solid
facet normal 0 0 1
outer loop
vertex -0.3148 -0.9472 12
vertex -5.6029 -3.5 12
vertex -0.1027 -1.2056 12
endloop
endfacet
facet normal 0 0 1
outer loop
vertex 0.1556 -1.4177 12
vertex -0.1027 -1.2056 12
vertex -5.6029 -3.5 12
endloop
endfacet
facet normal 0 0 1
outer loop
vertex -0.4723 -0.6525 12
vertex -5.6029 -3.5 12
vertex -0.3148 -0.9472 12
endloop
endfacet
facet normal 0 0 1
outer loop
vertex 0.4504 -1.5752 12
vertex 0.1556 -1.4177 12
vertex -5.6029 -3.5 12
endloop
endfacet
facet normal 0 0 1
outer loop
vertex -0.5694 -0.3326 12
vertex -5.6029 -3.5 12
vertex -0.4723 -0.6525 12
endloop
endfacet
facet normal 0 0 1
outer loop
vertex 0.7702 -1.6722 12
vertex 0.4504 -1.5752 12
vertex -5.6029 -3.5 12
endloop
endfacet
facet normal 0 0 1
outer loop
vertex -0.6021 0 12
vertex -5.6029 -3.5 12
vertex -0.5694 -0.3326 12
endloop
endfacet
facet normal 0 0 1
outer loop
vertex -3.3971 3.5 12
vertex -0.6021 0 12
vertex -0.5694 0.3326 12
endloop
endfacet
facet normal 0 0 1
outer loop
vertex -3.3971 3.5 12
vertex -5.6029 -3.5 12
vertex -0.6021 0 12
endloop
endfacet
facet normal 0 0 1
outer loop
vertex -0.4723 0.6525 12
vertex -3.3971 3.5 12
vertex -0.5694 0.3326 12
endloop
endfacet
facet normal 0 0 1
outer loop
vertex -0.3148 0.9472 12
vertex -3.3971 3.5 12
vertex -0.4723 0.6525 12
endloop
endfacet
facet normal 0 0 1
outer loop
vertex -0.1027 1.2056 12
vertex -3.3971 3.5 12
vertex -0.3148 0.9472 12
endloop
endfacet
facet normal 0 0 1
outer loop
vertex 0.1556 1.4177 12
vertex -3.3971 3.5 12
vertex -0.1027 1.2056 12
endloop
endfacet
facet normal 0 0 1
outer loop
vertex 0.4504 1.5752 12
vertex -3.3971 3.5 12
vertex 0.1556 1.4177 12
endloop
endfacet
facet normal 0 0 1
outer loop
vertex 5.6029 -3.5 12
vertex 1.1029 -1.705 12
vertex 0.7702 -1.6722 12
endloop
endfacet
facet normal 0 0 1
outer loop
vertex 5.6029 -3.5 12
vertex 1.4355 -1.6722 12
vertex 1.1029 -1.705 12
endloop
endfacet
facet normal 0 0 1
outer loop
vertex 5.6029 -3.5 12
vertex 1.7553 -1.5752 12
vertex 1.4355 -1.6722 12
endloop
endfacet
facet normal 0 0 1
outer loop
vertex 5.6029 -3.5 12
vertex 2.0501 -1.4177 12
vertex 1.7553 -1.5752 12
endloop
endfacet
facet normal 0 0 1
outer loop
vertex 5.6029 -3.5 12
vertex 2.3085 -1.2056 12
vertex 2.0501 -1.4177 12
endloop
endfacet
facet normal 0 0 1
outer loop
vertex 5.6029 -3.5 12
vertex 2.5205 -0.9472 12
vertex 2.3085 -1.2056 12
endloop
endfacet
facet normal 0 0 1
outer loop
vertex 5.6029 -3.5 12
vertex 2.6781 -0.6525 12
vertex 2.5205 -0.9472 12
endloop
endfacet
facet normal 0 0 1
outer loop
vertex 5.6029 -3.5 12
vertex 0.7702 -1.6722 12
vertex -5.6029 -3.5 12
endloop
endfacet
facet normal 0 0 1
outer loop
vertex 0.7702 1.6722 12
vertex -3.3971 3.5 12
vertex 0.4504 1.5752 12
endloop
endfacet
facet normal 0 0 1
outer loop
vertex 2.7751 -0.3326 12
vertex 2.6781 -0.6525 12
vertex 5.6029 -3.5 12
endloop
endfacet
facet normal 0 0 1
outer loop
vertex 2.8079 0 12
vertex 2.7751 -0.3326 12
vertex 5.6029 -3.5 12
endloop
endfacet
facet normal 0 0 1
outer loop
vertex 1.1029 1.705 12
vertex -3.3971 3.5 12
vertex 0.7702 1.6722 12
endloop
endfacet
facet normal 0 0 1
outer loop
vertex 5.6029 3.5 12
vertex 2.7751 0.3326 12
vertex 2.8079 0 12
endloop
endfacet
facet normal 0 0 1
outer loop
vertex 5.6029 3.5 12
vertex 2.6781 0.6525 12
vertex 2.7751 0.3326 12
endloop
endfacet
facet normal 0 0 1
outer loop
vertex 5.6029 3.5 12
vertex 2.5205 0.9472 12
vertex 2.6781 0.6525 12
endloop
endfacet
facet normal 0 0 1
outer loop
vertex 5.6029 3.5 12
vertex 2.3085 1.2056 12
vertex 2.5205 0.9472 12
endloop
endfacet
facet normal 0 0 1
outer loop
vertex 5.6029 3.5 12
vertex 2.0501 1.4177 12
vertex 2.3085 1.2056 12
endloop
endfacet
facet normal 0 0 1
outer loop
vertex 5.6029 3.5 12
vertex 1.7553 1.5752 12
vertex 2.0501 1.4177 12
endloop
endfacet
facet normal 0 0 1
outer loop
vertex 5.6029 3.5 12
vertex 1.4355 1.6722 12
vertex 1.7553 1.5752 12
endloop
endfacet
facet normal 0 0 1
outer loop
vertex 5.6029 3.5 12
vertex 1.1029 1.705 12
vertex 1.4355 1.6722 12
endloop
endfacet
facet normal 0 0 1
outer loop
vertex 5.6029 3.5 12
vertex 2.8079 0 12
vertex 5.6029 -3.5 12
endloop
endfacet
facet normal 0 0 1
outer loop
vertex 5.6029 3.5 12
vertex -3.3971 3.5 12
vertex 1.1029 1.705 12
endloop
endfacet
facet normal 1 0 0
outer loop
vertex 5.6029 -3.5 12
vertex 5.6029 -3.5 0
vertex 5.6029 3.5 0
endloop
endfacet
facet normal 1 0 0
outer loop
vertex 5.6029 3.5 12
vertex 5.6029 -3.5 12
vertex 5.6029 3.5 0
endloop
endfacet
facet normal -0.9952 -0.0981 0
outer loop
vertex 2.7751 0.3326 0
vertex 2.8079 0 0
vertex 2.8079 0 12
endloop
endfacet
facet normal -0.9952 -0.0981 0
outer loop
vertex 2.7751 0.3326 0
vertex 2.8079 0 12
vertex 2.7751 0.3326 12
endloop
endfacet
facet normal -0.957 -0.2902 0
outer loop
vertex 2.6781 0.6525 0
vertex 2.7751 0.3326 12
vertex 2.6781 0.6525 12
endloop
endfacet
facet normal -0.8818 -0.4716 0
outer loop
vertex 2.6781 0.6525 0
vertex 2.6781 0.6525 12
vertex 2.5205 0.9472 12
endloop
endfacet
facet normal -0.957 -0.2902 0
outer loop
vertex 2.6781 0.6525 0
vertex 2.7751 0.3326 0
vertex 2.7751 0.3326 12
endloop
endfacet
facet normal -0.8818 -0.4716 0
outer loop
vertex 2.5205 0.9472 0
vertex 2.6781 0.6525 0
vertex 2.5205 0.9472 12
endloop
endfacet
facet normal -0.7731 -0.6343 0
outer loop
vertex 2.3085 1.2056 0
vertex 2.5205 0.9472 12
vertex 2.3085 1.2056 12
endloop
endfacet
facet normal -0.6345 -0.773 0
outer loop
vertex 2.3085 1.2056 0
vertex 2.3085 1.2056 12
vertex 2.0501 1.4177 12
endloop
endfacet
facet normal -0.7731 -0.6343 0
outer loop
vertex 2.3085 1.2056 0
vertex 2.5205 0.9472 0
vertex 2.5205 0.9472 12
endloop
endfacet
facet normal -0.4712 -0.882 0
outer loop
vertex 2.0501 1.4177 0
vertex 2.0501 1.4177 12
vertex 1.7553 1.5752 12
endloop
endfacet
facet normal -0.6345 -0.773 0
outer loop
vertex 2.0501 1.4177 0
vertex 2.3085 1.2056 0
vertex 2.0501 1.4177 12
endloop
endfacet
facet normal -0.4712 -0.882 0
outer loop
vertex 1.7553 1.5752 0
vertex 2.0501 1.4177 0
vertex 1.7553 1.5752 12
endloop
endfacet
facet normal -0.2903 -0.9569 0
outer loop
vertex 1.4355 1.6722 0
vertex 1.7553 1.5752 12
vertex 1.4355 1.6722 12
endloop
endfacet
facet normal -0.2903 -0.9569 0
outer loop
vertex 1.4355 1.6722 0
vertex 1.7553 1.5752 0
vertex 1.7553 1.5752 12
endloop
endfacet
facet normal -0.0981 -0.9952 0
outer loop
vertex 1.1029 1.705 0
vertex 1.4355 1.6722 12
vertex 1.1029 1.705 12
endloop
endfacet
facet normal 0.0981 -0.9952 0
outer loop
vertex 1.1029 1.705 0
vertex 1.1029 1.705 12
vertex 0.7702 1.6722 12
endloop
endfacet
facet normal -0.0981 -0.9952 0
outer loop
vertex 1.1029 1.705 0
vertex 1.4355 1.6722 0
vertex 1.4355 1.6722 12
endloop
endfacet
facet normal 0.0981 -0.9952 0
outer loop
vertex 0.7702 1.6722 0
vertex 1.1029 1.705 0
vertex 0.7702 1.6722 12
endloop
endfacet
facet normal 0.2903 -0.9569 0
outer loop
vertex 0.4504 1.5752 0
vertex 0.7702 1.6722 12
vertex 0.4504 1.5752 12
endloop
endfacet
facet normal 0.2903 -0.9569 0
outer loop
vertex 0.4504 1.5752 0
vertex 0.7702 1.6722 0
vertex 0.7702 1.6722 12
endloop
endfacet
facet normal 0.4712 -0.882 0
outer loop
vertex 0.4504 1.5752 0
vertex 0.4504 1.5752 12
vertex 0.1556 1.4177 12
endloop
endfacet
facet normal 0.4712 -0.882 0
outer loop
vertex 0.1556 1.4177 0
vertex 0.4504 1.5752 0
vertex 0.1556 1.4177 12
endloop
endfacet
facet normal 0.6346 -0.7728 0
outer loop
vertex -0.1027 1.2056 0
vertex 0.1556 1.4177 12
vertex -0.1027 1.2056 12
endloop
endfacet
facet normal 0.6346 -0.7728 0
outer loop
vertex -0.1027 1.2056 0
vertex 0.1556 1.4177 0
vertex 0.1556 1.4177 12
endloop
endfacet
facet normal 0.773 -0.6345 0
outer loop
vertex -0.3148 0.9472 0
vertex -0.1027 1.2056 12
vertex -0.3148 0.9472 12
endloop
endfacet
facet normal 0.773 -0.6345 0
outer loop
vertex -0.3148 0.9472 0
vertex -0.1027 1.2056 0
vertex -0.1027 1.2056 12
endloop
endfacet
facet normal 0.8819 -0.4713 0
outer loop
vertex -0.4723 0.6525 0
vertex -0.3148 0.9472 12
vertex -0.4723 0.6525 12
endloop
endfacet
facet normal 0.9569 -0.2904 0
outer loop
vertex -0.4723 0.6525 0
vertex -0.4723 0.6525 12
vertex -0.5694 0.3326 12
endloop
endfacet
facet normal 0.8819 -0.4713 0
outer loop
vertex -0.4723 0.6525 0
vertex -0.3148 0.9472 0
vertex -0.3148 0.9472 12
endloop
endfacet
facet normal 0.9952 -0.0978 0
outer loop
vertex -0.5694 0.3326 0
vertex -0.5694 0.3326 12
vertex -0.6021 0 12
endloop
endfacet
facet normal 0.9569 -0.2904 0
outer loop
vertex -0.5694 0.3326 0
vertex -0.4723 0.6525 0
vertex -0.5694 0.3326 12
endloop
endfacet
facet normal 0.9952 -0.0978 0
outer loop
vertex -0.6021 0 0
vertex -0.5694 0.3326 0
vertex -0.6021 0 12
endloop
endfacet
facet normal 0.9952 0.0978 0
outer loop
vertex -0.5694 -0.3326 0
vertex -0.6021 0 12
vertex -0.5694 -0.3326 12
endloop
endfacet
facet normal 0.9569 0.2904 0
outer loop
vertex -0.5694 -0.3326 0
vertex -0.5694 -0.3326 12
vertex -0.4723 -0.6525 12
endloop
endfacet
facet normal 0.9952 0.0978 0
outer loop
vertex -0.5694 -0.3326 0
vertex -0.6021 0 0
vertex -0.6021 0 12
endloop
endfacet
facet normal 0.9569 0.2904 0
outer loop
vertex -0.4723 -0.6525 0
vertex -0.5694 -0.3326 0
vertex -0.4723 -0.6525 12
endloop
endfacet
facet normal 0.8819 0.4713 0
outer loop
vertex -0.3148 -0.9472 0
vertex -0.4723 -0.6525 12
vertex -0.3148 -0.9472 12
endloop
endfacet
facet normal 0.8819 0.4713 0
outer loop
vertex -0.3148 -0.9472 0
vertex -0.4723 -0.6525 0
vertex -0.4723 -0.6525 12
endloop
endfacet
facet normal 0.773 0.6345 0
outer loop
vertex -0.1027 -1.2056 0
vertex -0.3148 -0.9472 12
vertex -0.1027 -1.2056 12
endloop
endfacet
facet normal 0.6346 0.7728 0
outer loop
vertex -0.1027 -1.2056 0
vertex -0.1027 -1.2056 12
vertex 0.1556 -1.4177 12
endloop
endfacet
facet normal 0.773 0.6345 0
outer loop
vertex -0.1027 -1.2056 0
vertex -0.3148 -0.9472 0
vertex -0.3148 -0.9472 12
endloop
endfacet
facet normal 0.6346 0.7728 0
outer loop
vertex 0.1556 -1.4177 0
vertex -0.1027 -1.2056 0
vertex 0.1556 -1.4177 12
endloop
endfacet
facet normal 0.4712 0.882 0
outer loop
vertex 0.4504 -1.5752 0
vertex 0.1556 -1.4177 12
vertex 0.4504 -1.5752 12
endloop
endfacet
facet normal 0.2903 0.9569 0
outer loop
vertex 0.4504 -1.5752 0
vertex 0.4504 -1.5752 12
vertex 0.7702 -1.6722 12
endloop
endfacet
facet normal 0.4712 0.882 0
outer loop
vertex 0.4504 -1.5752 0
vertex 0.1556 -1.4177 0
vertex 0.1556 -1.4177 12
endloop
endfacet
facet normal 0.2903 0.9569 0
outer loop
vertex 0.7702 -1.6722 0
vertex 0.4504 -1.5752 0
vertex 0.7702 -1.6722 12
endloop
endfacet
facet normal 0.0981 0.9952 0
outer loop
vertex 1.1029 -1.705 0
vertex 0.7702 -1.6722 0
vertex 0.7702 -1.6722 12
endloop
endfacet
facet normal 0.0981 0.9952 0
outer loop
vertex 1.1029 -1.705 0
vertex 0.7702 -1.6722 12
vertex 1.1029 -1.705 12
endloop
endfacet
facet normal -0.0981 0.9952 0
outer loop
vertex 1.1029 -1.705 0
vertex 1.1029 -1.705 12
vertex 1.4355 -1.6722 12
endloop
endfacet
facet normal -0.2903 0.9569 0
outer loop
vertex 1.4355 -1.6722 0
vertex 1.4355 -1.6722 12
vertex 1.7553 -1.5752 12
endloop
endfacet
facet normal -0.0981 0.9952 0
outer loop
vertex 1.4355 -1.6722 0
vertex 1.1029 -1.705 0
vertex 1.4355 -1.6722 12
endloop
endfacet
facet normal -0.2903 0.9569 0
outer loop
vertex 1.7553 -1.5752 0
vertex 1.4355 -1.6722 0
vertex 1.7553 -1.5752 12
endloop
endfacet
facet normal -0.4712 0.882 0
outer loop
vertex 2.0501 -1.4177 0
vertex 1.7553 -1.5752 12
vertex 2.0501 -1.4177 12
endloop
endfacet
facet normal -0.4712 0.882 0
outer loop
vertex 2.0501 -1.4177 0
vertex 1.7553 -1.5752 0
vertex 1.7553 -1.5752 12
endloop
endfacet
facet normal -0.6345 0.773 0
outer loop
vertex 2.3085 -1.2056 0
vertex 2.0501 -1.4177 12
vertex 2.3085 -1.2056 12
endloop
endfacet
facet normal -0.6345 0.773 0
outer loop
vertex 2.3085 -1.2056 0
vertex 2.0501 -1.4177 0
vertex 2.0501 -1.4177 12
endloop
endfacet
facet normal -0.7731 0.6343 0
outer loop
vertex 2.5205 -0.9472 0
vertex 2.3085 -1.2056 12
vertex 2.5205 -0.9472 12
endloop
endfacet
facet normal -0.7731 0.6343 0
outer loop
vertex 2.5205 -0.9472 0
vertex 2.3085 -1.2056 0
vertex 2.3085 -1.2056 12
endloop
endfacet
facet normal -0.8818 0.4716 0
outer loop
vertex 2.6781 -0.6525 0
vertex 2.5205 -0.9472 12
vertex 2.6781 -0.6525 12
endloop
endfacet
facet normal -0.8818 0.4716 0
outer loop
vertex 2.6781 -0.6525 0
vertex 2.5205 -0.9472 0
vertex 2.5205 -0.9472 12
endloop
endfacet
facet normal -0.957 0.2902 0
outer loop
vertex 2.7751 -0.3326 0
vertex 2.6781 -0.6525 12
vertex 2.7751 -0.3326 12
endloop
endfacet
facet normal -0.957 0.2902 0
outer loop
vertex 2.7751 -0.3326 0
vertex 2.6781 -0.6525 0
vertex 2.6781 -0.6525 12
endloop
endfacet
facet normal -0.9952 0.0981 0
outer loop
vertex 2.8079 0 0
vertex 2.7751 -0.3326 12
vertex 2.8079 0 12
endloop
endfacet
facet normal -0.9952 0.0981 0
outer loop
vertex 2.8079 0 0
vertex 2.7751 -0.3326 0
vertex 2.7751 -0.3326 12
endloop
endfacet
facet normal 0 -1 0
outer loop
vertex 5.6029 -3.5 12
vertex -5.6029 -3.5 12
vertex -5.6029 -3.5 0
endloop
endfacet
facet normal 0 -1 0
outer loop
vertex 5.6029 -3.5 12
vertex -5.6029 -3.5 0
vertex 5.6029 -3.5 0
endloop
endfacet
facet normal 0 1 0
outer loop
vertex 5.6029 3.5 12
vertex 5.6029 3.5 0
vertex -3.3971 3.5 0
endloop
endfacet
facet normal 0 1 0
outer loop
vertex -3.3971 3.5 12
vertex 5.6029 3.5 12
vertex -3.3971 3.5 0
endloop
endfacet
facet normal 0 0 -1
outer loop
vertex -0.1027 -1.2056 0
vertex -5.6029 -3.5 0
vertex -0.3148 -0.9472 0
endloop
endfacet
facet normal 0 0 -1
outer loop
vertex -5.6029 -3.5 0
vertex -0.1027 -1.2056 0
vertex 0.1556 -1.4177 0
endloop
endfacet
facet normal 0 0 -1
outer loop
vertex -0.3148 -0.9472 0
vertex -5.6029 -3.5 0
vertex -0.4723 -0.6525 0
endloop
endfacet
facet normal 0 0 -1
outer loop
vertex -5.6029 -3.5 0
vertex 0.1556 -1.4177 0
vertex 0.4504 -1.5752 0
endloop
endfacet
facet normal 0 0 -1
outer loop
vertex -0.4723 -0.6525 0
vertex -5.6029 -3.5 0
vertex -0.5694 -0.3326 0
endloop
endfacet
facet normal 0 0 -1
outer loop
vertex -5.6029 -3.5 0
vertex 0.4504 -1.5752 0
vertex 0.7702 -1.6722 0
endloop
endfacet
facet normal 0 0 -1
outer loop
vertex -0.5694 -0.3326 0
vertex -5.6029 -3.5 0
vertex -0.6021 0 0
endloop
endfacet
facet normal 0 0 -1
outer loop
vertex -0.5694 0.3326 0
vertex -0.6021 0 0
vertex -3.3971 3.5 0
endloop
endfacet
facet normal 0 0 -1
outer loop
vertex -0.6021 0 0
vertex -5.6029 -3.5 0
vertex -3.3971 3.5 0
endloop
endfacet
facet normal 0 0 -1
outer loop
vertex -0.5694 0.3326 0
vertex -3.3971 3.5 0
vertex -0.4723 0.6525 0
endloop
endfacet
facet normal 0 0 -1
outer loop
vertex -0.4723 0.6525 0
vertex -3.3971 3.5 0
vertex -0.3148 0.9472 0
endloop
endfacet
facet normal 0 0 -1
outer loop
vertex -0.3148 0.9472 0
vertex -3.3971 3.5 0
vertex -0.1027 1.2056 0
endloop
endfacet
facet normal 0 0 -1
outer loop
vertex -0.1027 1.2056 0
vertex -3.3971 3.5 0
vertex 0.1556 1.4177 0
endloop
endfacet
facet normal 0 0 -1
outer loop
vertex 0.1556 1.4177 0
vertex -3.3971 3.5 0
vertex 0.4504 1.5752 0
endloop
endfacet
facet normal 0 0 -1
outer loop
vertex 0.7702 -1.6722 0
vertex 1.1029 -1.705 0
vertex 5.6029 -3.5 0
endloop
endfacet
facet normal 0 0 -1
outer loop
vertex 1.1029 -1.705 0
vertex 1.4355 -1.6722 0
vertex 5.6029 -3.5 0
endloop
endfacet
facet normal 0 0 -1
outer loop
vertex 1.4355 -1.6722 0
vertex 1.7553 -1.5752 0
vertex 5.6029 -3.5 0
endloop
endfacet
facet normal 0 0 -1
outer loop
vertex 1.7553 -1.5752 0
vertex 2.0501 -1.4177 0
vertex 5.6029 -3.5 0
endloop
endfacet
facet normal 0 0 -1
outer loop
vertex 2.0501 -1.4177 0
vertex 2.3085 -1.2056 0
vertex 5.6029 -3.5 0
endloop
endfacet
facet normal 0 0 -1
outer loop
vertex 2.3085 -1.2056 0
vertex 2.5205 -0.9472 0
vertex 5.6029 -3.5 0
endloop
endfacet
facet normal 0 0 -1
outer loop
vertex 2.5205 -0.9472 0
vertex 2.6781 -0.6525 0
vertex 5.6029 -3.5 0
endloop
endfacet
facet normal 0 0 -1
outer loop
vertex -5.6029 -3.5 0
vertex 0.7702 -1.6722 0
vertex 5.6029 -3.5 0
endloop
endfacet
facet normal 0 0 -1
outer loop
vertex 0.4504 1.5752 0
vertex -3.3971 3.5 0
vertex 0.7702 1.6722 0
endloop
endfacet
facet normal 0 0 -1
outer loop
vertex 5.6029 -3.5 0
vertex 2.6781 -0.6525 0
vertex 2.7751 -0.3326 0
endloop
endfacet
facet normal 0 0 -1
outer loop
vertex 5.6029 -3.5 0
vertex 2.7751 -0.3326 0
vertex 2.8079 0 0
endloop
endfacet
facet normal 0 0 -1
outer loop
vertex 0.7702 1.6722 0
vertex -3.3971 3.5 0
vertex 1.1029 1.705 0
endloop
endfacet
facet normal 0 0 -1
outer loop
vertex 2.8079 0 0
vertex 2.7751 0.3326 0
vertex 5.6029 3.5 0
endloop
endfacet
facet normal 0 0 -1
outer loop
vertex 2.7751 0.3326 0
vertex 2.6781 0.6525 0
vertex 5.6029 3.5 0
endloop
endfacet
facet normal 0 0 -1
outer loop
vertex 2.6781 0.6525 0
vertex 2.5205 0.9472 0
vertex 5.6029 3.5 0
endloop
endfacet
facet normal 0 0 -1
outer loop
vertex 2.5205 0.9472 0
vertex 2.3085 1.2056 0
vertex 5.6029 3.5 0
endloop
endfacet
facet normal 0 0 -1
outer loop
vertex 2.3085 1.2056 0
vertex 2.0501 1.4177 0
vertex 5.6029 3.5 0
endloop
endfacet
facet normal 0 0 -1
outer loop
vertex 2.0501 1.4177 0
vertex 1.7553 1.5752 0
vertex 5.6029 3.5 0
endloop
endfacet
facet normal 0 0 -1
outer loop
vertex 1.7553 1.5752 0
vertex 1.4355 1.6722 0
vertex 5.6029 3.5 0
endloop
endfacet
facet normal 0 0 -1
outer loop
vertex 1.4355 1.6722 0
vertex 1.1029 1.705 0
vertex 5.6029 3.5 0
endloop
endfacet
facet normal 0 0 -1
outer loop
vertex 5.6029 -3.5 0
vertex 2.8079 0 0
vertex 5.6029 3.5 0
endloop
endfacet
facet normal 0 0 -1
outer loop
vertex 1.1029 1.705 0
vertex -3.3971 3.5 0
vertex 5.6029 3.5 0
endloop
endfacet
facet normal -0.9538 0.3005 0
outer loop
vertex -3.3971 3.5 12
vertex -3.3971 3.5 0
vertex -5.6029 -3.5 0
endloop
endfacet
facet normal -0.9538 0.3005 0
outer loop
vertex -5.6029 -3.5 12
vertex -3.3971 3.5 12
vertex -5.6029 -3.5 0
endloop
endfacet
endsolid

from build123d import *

# Parameters (mm, degrees)
SKETCH1_R           = 1.705
BOSS_EXTRUDE1_DEPTH = 12


with BuildPart() as part:
    # Sketch1 → Boss-Extrude1 (new body)
    with BuildSketch(Plane.XY):
        Polygon((-3.397125795, 3.5), (-5.602874205, -3.5), (5.602874205, -3.5), (5.602874205, 3.5), align=None)
        with Locations((1.102874205, 0)):
            Circle(SKETCH1_R, mode=Mode.SUBTRACT)
    extrude(amount=BOSS_EXTRUDE1_DEPTH)


solid = part.part
